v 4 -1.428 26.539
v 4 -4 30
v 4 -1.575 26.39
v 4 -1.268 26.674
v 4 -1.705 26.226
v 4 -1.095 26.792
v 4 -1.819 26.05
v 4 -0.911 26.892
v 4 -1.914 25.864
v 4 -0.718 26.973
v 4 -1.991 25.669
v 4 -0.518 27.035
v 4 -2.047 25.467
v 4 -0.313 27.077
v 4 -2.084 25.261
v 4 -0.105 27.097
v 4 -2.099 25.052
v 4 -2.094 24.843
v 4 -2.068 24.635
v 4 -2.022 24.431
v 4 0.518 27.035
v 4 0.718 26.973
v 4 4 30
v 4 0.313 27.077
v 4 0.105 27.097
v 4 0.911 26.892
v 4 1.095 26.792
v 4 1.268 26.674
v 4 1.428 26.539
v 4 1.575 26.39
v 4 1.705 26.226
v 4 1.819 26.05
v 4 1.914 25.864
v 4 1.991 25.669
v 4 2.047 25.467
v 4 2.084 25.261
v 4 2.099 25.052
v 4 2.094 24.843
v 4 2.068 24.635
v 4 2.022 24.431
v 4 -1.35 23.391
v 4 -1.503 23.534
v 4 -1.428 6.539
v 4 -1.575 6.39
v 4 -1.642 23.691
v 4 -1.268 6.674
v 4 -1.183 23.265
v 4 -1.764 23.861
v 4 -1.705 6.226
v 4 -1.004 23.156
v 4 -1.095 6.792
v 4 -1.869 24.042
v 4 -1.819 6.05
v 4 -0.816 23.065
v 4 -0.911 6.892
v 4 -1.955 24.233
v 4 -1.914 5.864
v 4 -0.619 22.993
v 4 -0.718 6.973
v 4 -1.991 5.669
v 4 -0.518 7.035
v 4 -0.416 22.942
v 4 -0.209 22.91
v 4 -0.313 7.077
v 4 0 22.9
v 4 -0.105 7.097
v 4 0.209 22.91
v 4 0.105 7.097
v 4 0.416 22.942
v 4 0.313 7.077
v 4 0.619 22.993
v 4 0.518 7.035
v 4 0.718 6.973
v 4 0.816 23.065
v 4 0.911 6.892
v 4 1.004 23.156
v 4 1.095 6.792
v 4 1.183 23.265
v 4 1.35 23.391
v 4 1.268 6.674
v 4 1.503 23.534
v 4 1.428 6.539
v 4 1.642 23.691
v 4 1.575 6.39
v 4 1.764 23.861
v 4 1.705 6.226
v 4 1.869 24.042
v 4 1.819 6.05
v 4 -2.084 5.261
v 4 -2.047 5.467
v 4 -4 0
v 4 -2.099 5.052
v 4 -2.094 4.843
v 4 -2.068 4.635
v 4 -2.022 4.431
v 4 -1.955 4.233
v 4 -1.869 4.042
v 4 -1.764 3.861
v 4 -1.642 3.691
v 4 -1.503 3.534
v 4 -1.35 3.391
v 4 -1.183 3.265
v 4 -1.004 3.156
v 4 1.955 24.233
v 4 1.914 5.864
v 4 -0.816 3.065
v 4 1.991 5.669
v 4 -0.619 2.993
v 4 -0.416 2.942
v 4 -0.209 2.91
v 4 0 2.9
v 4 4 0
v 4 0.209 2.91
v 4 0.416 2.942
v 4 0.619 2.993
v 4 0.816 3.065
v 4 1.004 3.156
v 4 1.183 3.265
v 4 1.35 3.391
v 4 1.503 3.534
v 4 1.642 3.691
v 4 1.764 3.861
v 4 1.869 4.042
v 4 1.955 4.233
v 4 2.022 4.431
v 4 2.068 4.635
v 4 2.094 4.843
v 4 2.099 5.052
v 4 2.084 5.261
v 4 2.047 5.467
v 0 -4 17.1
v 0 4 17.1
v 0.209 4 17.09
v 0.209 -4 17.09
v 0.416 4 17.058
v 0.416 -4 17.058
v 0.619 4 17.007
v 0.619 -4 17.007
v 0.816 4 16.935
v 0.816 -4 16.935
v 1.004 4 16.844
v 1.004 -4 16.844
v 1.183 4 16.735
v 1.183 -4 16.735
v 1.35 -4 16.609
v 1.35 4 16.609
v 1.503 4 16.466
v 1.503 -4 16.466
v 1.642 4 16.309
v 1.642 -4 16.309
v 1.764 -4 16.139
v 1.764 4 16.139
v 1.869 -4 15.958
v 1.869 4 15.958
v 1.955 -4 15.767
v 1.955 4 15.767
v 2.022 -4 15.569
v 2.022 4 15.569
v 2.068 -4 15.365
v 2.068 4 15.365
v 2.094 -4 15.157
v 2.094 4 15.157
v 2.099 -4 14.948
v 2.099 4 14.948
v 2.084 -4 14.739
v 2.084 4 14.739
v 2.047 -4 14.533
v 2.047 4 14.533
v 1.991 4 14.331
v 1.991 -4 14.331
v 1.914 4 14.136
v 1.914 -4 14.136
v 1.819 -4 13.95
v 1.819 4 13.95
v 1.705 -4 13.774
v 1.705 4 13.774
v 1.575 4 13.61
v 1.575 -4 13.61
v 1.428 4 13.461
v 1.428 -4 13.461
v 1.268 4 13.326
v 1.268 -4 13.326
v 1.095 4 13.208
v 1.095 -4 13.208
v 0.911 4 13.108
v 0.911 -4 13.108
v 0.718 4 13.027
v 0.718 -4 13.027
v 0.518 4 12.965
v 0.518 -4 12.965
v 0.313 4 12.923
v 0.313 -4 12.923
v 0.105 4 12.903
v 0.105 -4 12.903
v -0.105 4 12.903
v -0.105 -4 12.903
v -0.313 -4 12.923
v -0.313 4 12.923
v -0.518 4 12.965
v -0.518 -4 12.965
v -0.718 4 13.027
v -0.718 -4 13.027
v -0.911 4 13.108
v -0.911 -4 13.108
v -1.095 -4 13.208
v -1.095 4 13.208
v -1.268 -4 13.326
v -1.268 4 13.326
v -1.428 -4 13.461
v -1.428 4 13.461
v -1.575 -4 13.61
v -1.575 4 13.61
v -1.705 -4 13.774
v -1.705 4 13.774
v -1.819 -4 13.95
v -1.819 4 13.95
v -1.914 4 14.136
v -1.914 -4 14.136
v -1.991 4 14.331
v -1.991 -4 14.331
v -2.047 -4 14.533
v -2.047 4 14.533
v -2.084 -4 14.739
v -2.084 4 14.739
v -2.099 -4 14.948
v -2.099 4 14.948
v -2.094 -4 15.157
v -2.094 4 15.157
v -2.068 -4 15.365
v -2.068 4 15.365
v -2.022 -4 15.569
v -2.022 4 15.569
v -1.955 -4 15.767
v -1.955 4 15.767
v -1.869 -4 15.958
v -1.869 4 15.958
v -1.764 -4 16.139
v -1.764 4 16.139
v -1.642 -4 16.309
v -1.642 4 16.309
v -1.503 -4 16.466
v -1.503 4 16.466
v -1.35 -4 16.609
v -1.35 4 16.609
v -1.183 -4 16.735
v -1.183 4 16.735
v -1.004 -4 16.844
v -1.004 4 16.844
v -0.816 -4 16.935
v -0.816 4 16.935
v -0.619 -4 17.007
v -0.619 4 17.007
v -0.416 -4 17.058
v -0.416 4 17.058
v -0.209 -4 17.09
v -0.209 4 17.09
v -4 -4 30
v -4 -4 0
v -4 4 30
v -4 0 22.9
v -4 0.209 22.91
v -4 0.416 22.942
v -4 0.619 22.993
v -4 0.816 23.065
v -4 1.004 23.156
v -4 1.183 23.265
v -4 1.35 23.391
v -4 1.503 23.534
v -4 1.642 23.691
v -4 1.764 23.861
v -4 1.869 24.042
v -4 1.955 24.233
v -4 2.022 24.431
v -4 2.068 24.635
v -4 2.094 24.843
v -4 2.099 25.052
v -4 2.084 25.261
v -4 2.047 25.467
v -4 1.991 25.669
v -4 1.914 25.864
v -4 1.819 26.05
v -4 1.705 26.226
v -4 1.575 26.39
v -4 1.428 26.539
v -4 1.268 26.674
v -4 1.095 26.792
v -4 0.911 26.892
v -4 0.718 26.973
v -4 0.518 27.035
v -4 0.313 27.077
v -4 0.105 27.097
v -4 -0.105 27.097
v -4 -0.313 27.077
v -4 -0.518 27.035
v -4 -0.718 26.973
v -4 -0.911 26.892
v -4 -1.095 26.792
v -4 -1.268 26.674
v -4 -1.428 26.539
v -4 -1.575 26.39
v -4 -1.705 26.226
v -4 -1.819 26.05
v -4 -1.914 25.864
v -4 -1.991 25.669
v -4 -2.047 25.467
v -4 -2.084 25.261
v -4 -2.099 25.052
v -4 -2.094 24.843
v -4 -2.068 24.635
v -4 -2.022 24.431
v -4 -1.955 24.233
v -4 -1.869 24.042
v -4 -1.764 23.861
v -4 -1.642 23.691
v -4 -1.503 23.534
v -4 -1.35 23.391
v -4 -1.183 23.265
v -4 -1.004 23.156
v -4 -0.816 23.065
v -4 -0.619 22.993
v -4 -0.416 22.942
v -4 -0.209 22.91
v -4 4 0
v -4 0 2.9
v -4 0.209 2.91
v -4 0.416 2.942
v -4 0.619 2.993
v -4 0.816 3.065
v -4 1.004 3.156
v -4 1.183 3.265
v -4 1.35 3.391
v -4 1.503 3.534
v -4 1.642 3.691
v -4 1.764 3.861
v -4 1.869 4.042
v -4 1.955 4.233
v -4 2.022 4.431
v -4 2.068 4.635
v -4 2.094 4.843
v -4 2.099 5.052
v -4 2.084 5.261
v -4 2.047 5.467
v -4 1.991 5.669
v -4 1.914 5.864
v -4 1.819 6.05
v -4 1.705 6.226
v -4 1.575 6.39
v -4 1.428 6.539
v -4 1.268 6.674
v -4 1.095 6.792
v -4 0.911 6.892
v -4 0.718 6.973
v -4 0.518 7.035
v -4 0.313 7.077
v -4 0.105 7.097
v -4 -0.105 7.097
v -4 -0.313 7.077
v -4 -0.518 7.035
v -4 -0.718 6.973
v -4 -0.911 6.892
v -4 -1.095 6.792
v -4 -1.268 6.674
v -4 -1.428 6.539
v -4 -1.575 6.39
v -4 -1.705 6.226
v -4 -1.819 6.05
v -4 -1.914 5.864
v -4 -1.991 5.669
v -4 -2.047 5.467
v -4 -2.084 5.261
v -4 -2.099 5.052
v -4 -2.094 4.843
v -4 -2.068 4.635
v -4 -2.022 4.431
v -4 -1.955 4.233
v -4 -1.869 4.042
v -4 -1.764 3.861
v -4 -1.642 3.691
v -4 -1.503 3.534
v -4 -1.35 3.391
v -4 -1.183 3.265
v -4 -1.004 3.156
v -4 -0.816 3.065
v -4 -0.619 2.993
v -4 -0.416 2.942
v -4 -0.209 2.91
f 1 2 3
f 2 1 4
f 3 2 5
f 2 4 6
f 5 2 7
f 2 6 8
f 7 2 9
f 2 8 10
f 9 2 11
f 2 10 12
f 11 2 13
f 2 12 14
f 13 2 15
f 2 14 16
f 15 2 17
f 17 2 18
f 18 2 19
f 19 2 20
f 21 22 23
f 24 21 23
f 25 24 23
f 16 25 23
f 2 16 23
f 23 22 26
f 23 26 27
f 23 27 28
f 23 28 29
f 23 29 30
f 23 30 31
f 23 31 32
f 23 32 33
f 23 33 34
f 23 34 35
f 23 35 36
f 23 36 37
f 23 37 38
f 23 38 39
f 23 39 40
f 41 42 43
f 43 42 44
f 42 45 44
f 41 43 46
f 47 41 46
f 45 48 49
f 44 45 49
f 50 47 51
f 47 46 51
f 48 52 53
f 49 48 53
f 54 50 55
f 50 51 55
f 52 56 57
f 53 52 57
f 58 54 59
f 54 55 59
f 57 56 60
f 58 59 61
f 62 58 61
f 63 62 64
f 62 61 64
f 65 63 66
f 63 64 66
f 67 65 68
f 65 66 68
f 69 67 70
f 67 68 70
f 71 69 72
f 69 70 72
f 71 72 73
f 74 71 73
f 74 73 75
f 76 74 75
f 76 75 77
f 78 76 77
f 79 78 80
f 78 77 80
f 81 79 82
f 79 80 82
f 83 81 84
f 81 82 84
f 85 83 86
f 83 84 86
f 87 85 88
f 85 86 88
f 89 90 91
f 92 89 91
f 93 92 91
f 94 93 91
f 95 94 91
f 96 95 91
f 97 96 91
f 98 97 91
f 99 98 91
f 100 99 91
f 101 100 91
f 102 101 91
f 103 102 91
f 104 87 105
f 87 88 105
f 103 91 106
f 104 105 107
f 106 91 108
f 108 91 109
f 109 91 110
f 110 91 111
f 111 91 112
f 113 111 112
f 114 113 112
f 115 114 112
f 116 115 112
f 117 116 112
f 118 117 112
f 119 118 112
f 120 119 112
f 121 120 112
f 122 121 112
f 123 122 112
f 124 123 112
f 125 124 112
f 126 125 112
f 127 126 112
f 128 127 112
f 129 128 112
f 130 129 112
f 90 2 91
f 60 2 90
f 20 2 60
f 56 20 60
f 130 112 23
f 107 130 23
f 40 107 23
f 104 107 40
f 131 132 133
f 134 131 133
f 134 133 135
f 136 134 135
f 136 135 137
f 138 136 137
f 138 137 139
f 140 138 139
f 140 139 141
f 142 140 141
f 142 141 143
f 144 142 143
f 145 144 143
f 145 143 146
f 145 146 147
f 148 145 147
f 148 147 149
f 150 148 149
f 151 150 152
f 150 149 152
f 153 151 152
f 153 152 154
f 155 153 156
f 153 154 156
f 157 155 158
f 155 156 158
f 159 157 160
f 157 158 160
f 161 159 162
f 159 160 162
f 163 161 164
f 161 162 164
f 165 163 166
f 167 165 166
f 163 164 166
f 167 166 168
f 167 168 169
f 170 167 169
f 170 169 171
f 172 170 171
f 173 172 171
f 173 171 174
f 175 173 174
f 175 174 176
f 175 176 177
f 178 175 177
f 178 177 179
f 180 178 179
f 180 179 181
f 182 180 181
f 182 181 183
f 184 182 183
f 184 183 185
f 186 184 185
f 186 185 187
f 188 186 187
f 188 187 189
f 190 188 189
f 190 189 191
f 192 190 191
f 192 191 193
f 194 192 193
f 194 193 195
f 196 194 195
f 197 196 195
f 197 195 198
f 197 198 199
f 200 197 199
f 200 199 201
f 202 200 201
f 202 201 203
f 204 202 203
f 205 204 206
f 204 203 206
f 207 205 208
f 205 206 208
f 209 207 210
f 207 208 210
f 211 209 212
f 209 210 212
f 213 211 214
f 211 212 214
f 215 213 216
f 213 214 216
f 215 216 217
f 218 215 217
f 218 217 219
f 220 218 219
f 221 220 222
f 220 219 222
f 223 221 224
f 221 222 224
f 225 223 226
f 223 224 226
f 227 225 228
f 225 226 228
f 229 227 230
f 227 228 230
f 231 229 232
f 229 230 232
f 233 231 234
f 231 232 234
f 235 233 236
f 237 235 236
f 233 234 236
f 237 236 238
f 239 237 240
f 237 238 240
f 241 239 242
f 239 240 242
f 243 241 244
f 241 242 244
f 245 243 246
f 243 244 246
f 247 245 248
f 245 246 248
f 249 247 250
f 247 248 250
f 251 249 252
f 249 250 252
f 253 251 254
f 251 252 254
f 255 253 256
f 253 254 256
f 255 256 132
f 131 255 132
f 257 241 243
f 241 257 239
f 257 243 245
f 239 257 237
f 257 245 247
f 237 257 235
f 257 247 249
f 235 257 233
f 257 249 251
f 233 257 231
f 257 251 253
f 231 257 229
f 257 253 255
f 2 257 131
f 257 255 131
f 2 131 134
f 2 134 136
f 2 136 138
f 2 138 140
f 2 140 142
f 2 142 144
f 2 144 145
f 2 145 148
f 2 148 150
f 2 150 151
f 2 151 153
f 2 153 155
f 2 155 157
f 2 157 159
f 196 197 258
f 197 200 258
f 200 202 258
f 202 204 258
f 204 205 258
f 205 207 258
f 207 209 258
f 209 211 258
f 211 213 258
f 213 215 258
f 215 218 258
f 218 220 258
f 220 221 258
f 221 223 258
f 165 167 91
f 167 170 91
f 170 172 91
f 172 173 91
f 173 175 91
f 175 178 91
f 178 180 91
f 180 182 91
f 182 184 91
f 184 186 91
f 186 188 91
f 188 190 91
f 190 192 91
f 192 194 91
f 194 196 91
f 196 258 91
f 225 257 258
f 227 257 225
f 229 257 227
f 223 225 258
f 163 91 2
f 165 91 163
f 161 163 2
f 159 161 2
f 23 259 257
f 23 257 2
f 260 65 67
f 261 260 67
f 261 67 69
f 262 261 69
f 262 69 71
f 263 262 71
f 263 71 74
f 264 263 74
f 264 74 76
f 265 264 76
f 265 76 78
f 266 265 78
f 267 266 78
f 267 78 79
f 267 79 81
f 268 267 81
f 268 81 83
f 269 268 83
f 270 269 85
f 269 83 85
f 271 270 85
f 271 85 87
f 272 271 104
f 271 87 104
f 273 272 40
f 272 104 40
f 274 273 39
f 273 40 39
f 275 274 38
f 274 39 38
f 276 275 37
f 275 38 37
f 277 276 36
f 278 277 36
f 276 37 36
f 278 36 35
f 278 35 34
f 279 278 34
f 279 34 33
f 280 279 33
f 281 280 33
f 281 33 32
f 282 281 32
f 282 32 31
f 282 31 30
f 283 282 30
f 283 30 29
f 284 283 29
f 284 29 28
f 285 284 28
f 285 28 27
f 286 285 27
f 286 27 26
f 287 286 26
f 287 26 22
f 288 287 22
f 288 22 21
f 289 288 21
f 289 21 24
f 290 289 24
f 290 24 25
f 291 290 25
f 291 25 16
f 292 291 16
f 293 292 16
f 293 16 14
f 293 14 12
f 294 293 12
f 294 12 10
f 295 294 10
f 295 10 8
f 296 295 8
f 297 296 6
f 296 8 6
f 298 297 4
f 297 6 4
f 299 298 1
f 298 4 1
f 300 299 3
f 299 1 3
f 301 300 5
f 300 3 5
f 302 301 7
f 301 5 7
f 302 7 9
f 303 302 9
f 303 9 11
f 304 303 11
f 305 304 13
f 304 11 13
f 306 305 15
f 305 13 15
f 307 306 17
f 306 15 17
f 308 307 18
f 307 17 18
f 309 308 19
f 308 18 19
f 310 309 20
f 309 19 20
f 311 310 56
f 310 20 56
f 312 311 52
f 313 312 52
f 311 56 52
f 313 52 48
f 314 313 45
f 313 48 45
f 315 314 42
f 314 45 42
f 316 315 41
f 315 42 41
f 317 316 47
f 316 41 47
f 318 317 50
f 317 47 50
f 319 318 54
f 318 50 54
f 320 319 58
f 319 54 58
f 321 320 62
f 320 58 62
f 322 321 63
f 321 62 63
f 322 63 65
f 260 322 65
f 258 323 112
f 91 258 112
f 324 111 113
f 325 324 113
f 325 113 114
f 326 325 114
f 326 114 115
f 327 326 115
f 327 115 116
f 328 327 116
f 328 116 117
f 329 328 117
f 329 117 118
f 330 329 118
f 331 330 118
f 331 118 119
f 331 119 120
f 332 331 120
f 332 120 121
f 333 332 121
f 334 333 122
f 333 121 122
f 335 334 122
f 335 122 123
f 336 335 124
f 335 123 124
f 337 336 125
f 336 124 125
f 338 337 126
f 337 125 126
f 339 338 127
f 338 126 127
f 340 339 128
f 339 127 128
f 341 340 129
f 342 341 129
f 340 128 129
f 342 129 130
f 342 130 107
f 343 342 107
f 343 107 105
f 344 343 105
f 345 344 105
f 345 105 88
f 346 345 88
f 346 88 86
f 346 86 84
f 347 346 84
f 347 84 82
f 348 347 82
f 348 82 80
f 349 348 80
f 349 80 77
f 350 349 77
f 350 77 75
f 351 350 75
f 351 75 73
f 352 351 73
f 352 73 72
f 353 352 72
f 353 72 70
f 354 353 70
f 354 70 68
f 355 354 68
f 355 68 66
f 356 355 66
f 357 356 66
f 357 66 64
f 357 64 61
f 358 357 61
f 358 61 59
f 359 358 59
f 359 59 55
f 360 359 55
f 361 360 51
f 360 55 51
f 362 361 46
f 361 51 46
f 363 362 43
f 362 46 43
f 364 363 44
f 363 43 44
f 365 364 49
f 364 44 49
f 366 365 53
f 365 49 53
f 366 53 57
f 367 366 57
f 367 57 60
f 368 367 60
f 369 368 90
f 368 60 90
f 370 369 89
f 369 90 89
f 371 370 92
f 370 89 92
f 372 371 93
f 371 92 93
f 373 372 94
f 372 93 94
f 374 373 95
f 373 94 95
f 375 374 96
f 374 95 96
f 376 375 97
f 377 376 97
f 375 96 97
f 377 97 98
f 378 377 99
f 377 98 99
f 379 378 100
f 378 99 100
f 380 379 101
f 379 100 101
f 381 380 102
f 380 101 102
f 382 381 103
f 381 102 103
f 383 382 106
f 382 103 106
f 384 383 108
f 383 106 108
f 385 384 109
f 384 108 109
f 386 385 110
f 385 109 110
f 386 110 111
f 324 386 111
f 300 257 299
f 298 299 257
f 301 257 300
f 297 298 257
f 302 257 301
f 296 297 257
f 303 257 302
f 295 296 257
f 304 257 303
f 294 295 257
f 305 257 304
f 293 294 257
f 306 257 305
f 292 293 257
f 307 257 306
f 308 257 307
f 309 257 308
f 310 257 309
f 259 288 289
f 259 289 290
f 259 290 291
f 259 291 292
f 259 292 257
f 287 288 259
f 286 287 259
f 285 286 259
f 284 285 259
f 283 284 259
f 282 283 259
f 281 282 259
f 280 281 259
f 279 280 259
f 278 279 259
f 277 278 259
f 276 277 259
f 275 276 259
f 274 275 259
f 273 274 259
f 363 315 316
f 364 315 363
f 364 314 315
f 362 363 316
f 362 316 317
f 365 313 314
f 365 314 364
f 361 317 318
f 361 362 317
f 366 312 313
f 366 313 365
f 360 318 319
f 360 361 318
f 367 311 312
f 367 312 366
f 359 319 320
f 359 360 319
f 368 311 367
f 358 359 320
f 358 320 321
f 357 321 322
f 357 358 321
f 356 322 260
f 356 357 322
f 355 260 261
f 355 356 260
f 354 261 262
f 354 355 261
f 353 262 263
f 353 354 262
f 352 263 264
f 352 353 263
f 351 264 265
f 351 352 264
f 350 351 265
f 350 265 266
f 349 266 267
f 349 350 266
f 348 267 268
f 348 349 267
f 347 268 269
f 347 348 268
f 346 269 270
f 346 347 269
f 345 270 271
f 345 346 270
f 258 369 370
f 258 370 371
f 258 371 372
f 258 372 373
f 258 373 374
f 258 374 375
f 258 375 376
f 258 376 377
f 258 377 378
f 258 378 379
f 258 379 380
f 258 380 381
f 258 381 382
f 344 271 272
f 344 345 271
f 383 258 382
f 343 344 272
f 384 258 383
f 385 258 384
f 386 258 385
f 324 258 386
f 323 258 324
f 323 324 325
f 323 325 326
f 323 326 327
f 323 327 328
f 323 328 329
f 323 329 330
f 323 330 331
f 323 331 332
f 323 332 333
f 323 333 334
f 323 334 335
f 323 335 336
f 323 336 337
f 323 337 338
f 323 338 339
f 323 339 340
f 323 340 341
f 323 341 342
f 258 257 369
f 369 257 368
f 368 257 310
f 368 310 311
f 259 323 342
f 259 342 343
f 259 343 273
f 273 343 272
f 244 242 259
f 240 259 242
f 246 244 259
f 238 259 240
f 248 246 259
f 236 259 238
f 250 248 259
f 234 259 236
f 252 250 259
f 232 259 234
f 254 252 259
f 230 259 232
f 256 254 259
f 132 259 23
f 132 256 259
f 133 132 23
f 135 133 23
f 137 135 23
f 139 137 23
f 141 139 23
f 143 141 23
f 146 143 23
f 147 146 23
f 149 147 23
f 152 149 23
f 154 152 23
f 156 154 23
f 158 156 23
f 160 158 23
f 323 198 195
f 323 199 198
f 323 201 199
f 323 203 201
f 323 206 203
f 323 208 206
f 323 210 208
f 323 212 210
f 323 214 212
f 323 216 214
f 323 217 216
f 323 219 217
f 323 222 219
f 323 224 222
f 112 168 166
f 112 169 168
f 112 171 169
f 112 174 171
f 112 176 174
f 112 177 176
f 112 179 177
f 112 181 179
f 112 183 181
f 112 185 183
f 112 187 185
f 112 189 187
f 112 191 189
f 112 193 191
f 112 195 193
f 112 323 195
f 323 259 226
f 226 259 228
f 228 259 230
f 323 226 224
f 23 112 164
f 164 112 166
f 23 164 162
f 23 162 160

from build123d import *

# Parameters (mm, degrees)
SKETCH_2_W          = 8
SKETCH_2_H          = 8
EXTRUDE_1_DEPTH     = 30
SKETCH_3_R          = 2.1
CUT_EXTRUDE_1_DEPTH = 32.304951685
SKETCH_4_R          = 2.1
CUT_EXTRUDE_2_DEPTH = 32.304951685


with BuildPart() as part:
    # 草图2 → 凸台-拉伸1 (new body)
    with BuildSketch(Plane.XY):
        Rectangle(SKETCH_2_W, SKETCH_2_H)
    extrude(amount=EXTRUDE_1_DEPTH)

    # 草图3 → 切除-拉伸1 (cut, through all)
    with BuildSketch(Plane(origin=(0, 4, 0), x_dir=(1, 0, 0), z_dir=(0, 1, 0))):
        with Locations(Location((0, -15, 0), (0, 0, 270))):
            Circle(SKETCH_3_R)
    extrude(amount=-CUT_EXTRUDE_1_DEPTH, mode=Mode.SUBTRACT)

    # 草图4 → 切除-拉伸2 (cut, through all)
    with BuildSketch(Plane(origin=(4, 0, 0), x_dir=(0, 0, -1), z_dir=(1, 0, 0))):
        with Locations((-25, 0)):
            Circle(SKETCH_4_R)
        with Locations((-5, 0)):
            Circle(SKETCH_4_R)
    extrude(amount=-CUT_EXTRUDE_2_DEPTH, mode=Mode.SUBTRACT)


solid = part.part
